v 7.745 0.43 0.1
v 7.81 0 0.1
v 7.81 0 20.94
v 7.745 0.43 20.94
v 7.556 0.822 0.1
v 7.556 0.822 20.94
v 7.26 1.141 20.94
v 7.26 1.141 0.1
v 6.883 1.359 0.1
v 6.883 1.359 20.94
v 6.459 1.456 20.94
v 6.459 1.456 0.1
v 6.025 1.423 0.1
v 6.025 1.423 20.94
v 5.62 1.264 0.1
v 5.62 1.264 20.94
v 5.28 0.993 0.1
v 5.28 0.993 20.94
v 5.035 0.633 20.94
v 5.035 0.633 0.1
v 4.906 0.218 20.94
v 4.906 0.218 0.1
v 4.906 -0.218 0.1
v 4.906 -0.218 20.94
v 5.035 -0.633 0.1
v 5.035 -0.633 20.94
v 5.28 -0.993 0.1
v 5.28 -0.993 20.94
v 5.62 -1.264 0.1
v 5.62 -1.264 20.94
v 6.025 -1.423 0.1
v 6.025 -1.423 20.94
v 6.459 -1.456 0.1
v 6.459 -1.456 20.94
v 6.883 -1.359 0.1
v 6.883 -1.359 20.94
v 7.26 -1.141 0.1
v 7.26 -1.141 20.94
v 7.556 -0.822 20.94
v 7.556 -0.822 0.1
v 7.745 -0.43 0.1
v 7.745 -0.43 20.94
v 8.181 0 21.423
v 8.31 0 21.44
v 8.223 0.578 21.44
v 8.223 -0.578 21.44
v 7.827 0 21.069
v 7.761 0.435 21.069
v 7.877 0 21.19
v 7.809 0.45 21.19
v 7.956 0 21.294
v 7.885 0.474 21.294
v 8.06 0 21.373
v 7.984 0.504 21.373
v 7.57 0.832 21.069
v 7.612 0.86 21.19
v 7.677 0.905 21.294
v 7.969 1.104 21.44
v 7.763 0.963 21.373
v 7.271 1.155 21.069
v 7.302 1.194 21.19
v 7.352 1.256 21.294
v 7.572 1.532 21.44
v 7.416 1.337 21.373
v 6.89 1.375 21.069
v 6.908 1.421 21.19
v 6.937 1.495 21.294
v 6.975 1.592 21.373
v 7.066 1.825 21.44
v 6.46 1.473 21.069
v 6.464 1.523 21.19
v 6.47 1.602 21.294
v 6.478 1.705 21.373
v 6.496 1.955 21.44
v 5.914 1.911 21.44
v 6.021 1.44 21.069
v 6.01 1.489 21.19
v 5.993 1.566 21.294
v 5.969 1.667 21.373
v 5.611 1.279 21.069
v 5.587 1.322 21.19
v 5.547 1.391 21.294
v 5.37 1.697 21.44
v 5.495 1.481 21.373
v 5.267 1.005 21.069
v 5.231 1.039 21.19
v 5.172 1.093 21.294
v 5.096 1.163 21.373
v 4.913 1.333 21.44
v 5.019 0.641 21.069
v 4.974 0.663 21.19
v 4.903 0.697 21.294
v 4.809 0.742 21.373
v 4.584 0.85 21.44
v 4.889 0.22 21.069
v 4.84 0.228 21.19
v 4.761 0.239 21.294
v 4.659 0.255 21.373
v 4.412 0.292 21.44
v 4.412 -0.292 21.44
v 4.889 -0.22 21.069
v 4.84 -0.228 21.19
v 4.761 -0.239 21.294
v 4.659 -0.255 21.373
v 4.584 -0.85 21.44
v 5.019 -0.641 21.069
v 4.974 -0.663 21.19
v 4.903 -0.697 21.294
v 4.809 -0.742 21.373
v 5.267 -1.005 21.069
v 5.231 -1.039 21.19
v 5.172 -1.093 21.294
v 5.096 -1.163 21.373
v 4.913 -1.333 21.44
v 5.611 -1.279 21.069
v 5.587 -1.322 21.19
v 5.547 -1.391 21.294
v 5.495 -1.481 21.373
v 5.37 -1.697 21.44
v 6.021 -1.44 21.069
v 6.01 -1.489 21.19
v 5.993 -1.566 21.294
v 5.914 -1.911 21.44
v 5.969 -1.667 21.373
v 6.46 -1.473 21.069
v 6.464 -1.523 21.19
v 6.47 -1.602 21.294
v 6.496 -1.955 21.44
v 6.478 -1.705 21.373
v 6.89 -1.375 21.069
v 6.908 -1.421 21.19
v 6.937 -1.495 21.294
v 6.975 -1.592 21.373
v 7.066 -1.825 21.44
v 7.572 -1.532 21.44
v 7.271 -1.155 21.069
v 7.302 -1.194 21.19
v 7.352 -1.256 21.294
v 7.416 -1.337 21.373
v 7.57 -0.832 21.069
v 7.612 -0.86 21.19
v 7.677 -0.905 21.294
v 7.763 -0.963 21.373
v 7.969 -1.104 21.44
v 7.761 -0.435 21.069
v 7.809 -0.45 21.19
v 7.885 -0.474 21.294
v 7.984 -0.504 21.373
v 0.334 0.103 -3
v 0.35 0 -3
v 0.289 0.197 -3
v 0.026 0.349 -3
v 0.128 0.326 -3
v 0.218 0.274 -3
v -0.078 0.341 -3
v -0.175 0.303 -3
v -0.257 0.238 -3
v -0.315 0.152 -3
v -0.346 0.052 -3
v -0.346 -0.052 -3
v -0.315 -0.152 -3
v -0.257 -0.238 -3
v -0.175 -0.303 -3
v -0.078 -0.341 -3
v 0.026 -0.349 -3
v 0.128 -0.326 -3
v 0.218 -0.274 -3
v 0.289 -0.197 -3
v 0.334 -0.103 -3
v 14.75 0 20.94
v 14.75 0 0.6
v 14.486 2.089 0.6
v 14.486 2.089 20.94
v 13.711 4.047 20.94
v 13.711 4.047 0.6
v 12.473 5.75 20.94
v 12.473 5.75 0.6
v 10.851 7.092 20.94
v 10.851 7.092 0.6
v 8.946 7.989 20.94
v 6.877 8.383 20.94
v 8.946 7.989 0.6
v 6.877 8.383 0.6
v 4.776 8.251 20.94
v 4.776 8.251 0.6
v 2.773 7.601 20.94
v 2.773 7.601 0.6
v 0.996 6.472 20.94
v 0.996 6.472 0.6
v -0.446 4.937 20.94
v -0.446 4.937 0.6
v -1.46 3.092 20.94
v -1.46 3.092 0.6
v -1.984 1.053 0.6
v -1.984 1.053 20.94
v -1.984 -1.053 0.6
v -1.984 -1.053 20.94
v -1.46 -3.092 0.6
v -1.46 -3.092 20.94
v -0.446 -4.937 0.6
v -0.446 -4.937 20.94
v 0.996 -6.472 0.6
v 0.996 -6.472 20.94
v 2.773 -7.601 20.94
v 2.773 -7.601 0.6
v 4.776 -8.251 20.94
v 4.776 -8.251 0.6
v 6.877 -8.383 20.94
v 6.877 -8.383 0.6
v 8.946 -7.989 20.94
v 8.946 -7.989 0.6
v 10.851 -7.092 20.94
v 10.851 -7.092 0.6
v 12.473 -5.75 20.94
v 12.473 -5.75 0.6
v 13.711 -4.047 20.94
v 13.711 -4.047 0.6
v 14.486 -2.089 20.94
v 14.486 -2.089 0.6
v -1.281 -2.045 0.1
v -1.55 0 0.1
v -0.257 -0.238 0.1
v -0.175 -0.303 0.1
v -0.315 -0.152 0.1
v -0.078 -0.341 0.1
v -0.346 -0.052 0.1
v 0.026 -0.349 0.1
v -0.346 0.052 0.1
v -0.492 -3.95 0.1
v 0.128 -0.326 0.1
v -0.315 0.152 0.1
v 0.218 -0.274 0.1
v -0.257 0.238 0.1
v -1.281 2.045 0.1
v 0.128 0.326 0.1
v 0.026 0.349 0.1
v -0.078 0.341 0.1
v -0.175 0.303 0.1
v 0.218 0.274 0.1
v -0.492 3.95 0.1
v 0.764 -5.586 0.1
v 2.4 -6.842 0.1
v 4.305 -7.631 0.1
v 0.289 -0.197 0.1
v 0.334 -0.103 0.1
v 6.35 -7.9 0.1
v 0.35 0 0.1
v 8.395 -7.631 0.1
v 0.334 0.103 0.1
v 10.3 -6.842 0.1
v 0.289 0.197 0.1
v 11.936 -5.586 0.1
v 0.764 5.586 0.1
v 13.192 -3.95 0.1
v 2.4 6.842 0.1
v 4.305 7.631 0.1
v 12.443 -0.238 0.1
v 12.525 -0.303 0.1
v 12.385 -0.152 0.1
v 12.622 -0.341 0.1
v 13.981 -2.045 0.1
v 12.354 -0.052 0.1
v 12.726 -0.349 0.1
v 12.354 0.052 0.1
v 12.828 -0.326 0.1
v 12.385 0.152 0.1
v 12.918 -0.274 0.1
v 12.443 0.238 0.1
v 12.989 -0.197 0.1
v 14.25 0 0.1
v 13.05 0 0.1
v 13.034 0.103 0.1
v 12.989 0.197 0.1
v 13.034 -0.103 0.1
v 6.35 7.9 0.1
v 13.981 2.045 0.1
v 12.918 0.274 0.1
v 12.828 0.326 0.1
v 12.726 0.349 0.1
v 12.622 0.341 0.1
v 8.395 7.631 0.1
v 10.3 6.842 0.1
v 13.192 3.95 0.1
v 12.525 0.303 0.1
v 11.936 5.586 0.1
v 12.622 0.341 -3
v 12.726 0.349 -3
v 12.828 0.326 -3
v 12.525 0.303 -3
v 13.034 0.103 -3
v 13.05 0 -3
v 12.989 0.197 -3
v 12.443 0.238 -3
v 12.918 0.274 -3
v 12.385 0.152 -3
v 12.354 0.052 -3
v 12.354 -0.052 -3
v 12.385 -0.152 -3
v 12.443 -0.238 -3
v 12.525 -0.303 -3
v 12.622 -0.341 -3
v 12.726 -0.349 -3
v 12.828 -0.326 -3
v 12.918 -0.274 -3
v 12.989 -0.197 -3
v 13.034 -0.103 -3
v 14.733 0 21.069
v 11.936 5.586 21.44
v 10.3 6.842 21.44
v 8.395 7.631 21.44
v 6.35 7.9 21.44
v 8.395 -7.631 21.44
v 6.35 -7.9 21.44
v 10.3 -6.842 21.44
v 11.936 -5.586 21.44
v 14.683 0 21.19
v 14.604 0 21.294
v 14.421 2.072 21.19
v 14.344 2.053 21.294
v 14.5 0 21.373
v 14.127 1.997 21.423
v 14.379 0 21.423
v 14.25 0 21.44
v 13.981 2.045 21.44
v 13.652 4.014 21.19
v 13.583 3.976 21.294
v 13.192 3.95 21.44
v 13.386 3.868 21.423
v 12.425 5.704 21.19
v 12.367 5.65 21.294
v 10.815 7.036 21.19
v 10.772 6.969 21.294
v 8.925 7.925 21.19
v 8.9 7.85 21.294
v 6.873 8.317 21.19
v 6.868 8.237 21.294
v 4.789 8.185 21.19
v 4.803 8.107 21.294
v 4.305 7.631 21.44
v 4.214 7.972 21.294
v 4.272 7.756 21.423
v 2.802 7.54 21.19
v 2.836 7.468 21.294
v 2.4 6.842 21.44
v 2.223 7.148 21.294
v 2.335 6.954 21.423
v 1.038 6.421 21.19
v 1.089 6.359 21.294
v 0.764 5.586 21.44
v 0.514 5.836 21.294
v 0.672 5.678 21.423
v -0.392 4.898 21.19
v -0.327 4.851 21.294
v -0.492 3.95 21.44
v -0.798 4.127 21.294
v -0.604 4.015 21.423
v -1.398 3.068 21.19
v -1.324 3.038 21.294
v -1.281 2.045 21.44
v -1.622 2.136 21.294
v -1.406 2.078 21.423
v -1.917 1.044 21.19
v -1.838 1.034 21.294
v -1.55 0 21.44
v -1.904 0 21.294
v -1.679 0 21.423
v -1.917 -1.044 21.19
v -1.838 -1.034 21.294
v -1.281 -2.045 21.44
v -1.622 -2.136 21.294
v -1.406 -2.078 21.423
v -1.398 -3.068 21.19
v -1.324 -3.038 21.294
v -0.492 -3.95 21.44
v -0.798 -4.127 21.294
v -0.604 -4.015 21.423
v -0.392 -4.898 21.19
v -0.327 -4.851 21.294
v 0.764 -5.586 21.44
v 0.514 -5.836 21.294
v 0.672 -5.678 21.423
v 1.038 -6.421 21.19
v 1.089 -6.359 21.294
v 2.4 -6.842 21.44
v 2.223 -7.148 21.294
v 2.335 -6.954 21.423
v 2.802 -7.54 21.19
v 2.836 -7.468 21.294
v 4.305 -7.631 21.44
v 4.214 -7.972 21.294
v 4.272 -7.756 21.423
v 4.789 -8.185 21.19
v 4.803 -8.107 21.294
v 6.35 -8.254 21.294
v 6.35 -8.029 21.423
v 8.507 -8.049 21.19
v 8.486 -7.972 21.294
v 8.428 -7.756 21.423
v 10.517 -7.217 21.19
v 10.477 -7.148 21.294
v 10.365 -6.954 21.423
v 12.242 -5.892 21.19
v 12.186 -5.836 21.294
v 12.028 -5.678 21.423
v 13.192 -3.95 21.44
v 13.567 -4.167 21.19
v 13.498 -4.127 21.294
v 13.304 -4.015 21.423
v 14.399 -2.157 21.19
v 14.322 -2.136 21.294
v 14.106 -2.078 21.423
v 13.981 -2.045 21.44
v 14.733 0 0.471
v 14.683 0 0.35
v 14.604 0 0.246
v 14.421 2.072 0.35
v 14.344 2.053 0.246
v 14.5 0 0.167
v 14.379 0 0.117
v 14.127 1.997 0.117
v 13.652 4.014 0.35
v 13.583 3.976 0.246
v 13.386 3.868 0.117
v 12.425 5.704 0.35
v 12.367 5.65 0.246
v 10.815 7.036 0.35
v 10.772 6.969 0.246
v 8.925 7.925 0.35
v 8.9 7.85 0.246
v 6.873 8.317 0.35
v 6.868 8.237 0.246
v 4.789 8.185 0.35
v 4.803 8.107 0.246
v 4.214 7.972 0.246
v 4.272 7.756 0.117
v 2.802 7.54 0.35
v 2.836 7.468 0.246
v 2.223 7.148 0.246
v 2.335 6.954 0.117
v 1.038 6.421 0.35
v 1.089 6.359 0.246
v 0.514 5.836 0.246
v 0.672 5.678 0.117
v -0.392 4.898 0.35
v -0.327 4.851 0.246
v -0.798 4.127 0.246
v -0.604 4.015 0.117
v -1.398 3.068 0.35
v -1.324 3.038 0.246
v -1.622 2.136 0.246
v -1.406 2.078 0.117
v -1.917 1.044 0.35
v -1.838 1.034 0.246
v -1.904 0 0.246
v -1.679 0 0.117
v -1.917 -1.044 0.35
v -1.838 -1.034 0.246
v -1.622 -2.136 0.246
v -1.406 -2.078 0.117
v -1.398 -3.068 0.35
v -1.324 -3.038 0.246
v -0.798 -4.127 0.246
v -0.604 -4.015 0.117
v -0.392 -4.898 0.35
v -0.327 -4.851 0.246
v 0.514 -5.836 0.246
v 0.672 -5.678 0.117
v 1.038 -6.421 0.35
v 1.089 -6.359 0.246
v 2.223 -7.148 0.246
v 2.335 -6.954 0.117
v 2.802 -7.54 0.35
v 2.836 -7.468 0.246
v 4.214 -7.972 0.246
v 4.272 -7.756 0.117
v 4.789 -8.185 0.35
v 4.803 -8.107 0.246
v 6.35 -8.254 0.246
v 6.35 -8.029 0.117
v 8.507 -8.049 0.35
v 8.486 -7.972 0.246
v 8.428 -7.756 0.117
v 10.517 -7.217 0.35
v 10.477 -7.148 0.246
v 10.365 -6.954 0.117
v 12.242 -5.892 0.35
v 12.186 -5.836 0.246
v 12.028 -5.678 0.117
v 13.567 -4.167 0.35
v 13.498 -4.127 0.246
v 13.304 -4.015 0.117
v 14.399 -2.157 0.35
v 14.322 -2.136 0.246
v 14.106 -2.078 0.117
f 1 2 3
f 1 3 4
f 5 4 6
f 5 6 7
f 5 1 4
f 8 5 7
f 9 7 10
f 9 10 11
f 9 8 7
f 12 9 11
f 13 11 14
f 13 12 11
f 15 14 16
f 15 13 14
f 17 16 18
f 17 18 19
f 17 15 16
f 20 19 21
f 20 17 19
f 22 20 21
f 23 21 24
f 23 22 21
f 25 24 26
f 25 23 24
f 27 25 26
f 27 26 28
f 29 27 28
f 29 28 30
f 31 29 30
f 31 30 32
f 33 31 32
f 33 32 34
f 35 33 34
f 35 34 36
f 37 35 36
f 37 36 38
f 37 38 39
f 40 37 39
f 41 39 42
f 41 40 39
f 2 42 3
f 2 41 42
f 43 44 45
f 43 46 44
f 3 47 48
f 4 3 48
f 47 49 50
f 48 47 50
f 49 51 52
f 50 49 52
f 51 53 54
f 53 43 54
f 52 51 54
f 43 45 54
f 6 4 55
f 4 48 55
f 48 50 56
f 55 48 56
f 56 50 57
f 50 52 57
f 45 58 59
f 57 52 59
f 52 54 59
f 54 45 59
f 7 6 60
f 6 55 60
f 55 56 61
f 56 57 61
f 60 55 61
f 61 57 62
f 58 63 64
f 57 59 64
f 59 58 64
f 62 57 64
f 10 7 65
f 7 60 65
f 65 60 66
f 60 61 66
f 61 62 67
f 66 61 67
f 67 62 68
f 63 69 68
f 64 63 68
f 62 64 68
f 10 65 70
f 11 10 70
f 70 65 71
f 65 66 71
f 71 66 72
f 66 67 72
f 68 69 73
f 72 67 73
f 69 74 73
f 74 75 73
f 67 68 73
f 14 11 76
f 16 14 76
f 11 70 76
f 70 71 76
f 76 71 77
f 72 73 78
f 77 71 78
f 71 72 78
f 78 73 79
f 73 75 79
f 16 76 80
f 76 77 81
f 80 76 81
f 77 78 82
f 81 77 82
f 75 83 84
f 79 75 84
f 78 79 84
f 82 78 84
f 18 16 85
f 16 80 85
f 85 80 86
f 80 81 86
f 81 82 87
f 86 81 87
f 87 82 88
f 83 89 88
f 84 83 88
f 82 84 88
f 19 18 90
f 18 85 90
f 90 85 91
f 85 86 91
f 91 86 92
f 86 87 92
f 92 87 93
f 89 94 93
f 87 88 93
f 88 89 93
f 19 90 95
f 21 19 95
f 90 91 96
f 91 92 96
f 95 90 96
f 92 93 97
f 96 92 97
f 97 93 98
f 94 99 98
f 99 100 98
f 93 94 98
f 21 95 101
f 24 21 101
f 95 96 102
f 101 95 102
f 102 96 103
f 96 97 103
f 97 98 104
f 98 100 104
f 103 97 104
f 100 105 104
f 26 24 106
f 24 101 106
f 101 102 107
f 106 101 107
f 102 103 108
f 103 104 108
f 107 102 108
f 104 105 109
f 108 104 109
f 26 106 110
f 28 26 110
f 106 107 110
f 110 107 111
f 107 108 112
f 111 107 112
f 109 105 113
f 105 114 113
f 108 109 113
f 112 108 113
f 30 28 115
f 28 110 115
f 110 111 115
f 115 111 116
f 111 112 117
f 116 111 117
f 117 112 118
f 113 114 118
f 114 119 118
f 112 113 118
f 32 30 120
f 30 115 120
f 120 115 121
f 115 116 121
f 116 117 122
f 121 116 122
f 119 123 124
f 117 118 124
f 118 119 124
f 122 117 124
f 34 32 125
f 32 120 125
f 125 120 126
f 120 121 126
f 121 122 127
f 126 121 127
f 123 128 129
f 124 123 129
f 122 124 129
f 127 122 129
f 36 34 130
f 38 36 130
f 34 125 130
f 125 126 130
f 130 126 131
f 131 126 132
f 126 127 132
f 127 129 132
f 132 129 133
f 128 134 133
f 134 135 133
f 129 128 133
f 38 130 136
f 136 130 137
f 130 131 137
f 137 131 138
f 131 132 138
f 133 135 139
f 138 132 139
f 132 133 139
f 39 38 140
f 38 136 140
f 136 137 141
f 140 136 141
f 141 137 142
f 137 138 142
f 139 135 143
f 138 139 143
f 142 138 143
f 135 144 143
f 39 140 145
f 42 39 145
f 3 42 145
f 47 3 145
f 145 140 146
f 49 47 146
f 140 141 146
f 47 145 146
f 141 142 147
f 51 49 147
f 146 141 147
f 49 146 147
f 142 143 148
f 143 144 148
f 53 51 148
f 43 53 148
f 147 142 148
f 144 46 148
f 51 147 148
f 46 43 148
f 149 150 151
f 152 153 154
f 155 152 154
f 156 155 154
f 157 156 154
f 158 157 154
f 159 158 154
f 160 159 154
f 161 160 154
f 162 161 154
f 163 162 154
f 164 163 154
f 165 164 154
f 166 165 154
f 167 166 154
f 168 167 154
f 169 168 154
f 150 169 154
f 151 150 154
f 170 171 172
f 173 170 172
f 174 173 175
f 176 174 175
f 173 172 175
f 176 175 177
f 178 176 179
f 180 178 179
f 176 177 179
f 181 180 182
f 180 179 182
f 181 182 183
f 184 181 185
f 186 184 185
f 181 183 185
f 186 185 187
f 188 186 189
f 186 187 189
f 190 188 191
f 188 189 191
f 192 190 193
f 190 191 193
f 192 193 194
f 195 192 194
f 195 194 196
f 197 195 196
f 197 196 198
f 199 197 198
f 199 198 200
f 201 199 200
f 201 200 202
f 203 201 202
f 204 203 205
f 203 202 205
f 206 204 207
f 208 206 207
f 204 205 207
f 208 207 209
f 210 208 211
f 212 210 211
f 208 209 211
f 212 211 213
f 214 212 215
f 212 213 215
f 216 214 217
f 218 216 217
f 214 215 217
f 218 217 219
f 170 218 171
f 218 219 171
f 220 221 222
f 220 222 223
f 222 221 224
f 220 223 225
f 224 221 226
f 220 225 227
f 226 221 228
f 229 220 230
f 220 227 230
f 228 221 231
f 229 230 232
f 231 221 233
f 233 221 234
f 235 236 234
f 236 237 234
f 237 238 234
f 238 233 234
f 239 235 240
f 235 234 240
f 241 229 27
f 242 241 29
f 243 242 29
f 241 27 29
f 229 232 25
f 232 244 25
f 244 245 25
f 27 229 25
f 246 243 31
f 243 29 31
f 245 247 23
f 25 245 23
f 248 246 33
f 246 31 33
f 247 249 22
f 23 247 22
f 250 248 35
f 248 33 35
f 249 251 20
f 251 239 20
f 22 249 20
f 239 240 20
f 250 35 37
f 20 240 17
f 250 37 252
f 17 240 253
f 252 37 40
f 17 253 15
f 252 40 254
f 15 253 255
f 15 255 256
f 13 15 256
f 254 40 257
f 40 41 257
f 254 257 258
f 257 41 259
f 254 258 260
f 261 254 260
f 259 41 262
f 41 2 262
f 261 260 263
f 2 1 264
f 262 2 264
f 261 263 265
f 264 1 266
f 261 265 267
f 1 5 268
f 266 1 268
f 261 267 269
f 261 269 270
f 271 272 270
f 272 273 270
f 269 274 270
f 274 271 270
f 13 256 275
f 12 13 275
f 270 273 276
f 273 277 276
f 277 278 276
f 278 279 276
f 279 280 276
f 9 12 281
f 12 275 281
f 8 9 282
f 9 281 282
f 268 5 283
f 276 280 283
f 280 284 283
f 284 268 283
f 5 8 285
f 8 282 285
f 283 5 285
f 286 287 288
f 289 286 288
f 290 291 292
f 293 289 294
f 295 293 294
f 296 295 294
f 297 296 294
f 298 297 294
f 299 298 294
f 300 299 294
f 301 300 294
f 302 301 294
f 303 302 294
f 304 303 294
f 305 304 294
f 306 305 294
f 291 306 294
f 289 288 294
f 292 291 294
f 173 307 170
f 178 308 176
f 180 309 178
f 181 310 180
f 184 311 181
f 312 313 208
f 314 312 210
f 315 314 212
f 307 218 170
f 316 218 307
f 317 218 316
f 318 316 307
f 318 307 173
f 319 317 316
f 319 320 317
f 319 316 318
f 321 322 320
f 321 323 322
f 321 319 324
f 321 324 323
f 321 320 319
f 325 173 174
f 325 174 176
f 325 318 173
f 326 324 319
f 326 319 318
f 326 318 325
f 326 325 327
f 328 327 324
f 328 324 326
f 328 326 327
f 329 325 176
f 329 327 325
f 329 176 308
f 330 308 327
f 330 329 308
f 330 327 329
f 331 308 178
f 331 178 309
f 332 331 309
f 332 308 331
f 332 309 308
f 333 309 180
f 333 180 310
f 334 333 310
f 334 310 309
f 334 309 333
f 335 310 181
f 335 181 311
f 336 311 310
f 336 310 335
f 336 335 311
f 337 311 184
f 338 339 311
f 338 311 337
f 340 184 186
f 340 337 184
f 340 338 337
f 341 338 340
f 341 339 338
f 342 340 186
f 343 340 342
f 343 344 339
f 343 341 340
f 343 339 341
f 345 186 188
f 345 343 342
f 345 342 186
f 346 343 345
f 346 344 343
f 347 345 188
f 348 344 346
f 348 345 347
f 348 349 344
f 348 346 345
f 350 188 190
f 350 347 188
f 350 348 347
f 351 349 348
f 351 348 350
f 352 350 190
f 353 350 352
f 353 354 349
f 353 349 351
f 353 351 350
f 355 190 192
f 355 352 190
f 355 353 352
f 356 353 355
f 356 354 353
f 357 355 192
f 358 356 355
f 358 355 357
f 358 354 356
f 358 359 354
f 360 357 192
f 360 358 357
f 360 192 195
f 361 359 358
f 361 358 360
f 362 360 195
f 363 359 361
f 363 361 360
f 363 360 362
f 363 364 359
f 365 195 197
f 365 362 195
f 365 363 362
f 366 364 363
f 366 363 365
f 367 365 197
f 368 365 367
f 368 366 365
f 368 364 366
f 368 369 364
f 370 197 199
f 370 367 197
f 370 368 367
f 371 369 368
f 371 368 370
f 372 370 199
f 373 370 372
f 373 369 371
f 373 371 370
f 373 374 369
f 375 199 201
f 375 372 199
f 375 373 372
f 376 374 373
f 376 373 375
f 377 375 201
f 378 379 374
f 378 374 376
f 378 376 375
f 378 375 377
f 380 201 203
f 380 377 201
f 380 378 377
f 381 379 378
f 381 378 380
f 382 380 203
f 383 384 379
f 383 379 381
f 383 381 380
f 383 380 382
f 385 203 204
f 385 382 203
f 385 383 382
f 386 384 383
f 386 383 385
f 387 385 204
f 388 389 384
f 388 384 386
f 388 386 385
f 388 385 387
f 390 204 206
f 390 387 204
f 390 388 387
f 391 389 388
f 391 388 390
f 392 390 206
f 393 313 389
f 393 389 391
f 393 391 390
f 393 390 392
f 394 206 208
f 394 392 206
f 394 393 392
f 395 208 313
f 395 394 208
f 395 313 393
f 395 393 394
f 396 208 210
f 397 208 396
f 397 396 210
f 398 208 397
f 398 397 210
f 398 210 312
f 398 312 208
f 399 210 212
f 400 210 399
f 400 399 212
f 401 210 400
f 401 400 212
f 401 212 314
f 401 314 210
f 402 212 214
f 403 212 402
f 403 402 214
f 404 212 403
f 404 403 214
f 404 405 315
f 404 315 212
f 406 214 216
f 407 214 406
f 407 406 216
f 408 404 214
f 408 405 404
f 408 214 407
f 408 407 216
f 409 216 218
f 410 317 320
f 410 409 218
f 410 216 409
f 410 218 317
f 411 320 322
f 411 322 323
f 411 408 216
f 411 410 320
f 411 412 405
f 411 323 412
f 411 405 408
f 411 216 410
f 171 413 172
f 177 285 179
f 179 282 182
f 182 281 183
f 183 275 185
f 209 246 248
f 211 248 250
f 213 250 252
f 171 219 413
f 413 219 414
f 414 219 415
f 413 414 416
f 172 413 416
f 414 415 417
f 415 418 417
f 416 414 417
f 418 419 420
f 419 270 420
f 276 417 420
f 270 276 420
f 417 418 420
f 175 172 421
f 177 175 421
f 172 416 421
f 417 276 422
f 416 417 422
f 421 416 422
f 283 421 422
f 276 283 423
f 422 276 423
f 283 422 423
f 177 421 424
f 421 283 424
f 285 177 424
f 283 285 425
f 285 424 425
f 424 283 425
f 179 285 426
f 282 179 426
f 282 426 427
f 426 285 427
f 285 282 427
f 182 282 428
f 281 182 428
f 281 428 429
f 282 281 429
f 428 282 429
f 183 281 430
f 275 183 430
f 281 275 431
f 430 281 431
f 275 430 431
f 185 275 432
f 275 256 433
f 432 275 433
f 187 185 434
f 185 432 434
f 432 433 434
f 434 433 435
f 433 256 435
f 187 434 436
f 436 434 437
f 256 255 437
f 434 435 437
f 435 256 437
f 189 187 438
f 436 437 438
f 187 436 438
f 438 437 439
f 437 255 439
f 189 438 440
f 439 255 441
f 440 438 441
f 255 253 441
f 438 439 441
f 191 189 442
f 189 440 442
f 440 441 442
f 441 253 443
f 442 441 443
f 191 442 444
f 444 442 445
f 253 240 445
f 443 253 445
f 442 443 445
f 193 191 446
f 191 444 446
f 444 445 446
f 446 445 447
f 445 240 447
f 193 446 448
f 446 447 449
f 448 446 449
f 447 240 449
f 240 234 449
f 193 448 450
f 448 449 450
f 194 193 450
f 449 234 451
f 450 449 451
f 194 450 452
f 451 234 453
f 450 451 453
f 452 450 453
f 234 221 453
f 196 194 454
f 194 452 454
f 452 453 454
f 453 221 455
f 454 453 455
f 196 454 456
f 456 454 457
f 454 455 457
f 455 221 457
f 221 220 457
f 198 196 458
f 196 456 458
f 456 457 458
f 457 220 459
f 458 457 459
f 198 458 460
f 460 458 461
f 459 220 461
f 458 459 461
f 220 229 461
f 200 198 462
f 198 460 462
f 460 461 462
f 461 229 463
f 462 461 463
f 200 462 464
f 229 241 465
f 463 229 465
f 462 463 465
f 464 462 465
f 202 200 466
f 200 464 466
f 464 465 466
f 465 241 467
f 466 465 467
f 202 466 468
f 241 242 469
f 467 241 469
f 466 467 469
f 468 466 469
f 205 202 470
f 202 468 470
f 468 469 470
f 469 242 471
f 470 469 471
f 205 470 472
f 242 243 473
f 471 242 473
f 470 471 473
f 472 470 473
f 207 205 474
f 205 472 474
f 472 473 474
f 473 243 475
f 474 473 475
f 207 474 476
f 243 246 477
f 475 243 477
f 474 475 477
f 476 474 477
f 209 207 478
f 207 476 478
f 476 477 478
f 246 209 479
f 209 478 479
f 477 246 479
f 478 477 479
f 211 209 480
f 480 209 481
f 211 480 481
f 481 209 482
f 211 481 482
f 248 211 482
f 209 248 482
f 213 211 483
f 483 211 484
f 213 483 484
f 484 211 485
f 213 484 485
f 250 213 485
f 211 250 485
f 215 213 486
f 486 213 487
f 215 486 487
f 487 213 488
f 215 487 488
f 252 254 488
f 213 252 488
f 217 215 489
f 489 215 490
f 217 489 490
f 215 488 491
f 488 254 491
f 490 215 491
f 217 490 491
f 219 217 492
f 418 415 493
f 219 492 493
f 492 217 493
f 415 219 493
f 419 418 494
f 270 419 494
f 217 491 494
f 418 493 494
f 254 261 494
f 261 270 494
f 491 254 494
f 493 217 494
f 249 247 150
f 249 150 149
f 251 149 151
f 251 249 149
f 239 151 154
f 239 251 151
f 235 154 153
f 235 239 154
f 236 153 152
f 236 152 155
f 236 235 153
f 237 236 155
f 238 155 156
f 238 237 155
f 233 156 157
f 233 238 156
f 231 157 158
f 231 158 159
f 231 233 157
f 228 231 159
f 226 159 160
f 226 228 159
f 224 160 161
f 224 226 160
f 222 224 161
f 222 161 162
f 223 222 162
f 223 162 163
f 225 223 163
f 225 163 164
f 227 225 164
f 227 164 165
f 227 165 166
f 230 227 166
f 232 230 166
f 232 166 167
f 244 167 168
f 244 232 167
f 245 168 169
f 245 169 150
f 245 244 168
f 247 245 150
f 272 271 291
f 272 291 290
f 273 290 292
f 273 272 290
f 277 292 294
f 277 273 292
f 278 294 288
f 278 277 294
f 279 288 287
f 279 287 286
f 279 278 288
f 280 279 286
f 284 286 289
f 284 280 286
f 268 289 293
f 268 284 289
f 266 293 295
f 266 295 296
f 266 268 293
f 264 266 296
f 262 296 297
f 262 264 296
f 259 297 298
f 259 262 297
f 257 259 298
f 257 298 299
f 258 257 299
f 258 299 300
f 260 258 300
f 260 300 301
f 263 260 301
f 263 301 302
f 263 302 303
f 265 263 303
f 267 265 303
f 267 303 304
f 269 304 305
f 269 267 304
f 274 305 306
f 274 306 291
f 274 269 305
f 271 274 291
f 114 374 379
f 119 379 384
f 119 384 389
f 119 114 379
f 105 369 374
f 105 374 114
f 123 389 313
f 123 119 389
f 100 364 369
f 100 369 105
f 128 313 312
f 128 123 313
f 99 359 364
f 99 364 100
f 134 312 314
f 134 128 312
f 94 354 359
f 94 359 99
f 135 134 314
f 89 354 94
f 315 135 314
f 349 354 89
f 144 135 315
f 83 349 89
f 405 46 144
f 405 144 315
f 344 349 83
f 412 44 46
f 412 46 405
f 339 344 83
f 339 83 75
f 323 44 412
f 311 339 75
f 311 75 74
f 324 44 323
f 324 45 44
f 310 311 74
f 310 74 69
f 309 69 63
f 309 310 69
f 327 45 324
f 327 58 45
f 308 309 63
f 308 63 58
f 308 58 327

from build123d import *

# Parameters (mm, degrees)
SKETCH_R          = 8.4
SKETCH_R_2        = 1.46
PAD_DEPTH         = 21.34
FILLET_R          = 0.5
SKETCH001_R       = 0.35
PAD001_DEPTH      = 10.67
PAD001_DEPTH_BACK = 3.5


with BuildPart() as fillet_body:
    # Sketch → Pad (new body)
    with BuildSketch(Plane.XY.offset(0.1)):
        with Locations((6.35, 0)):
            Circle(SKETCH_R)
        with Locations((6.35, 0)):
            Circle(SKETCH_R_2, mode=Mode.SUBTRACT)
    extrude(amount=PAD_DEPTH)

    # Fillet
    fillet_edges = [fillet_body.edges().sort_by_distance(p)[0] for p in [
        (4.89, 0, 21.44),
        (-2.05, 0, 21.44),
        (-2.05, 0, 0.1),
    ]]
    fillet(fillet_edges, radius=FILLET_R)


with BuildPart() as pad001_mp_cp:
    # Sketch001 → Pad001 (new body, two sides)
    with BuildSketch(Plane.XY.offset(0.5)) as pad001_sk:
        Circle(SKETCH001_R)
        with Locations((12.7, 0)):
            Circle(SKETCH001_R)
    extrude(amount=PAD001_DEPTH)
    extrude(pad001_sk.sketch, amount=-PAD001_DEPTH_BACK)

    # Pad001_mp_cp: union Fillet body
    add(fillet_body.part)


solid = pad001_mp_cp.part
